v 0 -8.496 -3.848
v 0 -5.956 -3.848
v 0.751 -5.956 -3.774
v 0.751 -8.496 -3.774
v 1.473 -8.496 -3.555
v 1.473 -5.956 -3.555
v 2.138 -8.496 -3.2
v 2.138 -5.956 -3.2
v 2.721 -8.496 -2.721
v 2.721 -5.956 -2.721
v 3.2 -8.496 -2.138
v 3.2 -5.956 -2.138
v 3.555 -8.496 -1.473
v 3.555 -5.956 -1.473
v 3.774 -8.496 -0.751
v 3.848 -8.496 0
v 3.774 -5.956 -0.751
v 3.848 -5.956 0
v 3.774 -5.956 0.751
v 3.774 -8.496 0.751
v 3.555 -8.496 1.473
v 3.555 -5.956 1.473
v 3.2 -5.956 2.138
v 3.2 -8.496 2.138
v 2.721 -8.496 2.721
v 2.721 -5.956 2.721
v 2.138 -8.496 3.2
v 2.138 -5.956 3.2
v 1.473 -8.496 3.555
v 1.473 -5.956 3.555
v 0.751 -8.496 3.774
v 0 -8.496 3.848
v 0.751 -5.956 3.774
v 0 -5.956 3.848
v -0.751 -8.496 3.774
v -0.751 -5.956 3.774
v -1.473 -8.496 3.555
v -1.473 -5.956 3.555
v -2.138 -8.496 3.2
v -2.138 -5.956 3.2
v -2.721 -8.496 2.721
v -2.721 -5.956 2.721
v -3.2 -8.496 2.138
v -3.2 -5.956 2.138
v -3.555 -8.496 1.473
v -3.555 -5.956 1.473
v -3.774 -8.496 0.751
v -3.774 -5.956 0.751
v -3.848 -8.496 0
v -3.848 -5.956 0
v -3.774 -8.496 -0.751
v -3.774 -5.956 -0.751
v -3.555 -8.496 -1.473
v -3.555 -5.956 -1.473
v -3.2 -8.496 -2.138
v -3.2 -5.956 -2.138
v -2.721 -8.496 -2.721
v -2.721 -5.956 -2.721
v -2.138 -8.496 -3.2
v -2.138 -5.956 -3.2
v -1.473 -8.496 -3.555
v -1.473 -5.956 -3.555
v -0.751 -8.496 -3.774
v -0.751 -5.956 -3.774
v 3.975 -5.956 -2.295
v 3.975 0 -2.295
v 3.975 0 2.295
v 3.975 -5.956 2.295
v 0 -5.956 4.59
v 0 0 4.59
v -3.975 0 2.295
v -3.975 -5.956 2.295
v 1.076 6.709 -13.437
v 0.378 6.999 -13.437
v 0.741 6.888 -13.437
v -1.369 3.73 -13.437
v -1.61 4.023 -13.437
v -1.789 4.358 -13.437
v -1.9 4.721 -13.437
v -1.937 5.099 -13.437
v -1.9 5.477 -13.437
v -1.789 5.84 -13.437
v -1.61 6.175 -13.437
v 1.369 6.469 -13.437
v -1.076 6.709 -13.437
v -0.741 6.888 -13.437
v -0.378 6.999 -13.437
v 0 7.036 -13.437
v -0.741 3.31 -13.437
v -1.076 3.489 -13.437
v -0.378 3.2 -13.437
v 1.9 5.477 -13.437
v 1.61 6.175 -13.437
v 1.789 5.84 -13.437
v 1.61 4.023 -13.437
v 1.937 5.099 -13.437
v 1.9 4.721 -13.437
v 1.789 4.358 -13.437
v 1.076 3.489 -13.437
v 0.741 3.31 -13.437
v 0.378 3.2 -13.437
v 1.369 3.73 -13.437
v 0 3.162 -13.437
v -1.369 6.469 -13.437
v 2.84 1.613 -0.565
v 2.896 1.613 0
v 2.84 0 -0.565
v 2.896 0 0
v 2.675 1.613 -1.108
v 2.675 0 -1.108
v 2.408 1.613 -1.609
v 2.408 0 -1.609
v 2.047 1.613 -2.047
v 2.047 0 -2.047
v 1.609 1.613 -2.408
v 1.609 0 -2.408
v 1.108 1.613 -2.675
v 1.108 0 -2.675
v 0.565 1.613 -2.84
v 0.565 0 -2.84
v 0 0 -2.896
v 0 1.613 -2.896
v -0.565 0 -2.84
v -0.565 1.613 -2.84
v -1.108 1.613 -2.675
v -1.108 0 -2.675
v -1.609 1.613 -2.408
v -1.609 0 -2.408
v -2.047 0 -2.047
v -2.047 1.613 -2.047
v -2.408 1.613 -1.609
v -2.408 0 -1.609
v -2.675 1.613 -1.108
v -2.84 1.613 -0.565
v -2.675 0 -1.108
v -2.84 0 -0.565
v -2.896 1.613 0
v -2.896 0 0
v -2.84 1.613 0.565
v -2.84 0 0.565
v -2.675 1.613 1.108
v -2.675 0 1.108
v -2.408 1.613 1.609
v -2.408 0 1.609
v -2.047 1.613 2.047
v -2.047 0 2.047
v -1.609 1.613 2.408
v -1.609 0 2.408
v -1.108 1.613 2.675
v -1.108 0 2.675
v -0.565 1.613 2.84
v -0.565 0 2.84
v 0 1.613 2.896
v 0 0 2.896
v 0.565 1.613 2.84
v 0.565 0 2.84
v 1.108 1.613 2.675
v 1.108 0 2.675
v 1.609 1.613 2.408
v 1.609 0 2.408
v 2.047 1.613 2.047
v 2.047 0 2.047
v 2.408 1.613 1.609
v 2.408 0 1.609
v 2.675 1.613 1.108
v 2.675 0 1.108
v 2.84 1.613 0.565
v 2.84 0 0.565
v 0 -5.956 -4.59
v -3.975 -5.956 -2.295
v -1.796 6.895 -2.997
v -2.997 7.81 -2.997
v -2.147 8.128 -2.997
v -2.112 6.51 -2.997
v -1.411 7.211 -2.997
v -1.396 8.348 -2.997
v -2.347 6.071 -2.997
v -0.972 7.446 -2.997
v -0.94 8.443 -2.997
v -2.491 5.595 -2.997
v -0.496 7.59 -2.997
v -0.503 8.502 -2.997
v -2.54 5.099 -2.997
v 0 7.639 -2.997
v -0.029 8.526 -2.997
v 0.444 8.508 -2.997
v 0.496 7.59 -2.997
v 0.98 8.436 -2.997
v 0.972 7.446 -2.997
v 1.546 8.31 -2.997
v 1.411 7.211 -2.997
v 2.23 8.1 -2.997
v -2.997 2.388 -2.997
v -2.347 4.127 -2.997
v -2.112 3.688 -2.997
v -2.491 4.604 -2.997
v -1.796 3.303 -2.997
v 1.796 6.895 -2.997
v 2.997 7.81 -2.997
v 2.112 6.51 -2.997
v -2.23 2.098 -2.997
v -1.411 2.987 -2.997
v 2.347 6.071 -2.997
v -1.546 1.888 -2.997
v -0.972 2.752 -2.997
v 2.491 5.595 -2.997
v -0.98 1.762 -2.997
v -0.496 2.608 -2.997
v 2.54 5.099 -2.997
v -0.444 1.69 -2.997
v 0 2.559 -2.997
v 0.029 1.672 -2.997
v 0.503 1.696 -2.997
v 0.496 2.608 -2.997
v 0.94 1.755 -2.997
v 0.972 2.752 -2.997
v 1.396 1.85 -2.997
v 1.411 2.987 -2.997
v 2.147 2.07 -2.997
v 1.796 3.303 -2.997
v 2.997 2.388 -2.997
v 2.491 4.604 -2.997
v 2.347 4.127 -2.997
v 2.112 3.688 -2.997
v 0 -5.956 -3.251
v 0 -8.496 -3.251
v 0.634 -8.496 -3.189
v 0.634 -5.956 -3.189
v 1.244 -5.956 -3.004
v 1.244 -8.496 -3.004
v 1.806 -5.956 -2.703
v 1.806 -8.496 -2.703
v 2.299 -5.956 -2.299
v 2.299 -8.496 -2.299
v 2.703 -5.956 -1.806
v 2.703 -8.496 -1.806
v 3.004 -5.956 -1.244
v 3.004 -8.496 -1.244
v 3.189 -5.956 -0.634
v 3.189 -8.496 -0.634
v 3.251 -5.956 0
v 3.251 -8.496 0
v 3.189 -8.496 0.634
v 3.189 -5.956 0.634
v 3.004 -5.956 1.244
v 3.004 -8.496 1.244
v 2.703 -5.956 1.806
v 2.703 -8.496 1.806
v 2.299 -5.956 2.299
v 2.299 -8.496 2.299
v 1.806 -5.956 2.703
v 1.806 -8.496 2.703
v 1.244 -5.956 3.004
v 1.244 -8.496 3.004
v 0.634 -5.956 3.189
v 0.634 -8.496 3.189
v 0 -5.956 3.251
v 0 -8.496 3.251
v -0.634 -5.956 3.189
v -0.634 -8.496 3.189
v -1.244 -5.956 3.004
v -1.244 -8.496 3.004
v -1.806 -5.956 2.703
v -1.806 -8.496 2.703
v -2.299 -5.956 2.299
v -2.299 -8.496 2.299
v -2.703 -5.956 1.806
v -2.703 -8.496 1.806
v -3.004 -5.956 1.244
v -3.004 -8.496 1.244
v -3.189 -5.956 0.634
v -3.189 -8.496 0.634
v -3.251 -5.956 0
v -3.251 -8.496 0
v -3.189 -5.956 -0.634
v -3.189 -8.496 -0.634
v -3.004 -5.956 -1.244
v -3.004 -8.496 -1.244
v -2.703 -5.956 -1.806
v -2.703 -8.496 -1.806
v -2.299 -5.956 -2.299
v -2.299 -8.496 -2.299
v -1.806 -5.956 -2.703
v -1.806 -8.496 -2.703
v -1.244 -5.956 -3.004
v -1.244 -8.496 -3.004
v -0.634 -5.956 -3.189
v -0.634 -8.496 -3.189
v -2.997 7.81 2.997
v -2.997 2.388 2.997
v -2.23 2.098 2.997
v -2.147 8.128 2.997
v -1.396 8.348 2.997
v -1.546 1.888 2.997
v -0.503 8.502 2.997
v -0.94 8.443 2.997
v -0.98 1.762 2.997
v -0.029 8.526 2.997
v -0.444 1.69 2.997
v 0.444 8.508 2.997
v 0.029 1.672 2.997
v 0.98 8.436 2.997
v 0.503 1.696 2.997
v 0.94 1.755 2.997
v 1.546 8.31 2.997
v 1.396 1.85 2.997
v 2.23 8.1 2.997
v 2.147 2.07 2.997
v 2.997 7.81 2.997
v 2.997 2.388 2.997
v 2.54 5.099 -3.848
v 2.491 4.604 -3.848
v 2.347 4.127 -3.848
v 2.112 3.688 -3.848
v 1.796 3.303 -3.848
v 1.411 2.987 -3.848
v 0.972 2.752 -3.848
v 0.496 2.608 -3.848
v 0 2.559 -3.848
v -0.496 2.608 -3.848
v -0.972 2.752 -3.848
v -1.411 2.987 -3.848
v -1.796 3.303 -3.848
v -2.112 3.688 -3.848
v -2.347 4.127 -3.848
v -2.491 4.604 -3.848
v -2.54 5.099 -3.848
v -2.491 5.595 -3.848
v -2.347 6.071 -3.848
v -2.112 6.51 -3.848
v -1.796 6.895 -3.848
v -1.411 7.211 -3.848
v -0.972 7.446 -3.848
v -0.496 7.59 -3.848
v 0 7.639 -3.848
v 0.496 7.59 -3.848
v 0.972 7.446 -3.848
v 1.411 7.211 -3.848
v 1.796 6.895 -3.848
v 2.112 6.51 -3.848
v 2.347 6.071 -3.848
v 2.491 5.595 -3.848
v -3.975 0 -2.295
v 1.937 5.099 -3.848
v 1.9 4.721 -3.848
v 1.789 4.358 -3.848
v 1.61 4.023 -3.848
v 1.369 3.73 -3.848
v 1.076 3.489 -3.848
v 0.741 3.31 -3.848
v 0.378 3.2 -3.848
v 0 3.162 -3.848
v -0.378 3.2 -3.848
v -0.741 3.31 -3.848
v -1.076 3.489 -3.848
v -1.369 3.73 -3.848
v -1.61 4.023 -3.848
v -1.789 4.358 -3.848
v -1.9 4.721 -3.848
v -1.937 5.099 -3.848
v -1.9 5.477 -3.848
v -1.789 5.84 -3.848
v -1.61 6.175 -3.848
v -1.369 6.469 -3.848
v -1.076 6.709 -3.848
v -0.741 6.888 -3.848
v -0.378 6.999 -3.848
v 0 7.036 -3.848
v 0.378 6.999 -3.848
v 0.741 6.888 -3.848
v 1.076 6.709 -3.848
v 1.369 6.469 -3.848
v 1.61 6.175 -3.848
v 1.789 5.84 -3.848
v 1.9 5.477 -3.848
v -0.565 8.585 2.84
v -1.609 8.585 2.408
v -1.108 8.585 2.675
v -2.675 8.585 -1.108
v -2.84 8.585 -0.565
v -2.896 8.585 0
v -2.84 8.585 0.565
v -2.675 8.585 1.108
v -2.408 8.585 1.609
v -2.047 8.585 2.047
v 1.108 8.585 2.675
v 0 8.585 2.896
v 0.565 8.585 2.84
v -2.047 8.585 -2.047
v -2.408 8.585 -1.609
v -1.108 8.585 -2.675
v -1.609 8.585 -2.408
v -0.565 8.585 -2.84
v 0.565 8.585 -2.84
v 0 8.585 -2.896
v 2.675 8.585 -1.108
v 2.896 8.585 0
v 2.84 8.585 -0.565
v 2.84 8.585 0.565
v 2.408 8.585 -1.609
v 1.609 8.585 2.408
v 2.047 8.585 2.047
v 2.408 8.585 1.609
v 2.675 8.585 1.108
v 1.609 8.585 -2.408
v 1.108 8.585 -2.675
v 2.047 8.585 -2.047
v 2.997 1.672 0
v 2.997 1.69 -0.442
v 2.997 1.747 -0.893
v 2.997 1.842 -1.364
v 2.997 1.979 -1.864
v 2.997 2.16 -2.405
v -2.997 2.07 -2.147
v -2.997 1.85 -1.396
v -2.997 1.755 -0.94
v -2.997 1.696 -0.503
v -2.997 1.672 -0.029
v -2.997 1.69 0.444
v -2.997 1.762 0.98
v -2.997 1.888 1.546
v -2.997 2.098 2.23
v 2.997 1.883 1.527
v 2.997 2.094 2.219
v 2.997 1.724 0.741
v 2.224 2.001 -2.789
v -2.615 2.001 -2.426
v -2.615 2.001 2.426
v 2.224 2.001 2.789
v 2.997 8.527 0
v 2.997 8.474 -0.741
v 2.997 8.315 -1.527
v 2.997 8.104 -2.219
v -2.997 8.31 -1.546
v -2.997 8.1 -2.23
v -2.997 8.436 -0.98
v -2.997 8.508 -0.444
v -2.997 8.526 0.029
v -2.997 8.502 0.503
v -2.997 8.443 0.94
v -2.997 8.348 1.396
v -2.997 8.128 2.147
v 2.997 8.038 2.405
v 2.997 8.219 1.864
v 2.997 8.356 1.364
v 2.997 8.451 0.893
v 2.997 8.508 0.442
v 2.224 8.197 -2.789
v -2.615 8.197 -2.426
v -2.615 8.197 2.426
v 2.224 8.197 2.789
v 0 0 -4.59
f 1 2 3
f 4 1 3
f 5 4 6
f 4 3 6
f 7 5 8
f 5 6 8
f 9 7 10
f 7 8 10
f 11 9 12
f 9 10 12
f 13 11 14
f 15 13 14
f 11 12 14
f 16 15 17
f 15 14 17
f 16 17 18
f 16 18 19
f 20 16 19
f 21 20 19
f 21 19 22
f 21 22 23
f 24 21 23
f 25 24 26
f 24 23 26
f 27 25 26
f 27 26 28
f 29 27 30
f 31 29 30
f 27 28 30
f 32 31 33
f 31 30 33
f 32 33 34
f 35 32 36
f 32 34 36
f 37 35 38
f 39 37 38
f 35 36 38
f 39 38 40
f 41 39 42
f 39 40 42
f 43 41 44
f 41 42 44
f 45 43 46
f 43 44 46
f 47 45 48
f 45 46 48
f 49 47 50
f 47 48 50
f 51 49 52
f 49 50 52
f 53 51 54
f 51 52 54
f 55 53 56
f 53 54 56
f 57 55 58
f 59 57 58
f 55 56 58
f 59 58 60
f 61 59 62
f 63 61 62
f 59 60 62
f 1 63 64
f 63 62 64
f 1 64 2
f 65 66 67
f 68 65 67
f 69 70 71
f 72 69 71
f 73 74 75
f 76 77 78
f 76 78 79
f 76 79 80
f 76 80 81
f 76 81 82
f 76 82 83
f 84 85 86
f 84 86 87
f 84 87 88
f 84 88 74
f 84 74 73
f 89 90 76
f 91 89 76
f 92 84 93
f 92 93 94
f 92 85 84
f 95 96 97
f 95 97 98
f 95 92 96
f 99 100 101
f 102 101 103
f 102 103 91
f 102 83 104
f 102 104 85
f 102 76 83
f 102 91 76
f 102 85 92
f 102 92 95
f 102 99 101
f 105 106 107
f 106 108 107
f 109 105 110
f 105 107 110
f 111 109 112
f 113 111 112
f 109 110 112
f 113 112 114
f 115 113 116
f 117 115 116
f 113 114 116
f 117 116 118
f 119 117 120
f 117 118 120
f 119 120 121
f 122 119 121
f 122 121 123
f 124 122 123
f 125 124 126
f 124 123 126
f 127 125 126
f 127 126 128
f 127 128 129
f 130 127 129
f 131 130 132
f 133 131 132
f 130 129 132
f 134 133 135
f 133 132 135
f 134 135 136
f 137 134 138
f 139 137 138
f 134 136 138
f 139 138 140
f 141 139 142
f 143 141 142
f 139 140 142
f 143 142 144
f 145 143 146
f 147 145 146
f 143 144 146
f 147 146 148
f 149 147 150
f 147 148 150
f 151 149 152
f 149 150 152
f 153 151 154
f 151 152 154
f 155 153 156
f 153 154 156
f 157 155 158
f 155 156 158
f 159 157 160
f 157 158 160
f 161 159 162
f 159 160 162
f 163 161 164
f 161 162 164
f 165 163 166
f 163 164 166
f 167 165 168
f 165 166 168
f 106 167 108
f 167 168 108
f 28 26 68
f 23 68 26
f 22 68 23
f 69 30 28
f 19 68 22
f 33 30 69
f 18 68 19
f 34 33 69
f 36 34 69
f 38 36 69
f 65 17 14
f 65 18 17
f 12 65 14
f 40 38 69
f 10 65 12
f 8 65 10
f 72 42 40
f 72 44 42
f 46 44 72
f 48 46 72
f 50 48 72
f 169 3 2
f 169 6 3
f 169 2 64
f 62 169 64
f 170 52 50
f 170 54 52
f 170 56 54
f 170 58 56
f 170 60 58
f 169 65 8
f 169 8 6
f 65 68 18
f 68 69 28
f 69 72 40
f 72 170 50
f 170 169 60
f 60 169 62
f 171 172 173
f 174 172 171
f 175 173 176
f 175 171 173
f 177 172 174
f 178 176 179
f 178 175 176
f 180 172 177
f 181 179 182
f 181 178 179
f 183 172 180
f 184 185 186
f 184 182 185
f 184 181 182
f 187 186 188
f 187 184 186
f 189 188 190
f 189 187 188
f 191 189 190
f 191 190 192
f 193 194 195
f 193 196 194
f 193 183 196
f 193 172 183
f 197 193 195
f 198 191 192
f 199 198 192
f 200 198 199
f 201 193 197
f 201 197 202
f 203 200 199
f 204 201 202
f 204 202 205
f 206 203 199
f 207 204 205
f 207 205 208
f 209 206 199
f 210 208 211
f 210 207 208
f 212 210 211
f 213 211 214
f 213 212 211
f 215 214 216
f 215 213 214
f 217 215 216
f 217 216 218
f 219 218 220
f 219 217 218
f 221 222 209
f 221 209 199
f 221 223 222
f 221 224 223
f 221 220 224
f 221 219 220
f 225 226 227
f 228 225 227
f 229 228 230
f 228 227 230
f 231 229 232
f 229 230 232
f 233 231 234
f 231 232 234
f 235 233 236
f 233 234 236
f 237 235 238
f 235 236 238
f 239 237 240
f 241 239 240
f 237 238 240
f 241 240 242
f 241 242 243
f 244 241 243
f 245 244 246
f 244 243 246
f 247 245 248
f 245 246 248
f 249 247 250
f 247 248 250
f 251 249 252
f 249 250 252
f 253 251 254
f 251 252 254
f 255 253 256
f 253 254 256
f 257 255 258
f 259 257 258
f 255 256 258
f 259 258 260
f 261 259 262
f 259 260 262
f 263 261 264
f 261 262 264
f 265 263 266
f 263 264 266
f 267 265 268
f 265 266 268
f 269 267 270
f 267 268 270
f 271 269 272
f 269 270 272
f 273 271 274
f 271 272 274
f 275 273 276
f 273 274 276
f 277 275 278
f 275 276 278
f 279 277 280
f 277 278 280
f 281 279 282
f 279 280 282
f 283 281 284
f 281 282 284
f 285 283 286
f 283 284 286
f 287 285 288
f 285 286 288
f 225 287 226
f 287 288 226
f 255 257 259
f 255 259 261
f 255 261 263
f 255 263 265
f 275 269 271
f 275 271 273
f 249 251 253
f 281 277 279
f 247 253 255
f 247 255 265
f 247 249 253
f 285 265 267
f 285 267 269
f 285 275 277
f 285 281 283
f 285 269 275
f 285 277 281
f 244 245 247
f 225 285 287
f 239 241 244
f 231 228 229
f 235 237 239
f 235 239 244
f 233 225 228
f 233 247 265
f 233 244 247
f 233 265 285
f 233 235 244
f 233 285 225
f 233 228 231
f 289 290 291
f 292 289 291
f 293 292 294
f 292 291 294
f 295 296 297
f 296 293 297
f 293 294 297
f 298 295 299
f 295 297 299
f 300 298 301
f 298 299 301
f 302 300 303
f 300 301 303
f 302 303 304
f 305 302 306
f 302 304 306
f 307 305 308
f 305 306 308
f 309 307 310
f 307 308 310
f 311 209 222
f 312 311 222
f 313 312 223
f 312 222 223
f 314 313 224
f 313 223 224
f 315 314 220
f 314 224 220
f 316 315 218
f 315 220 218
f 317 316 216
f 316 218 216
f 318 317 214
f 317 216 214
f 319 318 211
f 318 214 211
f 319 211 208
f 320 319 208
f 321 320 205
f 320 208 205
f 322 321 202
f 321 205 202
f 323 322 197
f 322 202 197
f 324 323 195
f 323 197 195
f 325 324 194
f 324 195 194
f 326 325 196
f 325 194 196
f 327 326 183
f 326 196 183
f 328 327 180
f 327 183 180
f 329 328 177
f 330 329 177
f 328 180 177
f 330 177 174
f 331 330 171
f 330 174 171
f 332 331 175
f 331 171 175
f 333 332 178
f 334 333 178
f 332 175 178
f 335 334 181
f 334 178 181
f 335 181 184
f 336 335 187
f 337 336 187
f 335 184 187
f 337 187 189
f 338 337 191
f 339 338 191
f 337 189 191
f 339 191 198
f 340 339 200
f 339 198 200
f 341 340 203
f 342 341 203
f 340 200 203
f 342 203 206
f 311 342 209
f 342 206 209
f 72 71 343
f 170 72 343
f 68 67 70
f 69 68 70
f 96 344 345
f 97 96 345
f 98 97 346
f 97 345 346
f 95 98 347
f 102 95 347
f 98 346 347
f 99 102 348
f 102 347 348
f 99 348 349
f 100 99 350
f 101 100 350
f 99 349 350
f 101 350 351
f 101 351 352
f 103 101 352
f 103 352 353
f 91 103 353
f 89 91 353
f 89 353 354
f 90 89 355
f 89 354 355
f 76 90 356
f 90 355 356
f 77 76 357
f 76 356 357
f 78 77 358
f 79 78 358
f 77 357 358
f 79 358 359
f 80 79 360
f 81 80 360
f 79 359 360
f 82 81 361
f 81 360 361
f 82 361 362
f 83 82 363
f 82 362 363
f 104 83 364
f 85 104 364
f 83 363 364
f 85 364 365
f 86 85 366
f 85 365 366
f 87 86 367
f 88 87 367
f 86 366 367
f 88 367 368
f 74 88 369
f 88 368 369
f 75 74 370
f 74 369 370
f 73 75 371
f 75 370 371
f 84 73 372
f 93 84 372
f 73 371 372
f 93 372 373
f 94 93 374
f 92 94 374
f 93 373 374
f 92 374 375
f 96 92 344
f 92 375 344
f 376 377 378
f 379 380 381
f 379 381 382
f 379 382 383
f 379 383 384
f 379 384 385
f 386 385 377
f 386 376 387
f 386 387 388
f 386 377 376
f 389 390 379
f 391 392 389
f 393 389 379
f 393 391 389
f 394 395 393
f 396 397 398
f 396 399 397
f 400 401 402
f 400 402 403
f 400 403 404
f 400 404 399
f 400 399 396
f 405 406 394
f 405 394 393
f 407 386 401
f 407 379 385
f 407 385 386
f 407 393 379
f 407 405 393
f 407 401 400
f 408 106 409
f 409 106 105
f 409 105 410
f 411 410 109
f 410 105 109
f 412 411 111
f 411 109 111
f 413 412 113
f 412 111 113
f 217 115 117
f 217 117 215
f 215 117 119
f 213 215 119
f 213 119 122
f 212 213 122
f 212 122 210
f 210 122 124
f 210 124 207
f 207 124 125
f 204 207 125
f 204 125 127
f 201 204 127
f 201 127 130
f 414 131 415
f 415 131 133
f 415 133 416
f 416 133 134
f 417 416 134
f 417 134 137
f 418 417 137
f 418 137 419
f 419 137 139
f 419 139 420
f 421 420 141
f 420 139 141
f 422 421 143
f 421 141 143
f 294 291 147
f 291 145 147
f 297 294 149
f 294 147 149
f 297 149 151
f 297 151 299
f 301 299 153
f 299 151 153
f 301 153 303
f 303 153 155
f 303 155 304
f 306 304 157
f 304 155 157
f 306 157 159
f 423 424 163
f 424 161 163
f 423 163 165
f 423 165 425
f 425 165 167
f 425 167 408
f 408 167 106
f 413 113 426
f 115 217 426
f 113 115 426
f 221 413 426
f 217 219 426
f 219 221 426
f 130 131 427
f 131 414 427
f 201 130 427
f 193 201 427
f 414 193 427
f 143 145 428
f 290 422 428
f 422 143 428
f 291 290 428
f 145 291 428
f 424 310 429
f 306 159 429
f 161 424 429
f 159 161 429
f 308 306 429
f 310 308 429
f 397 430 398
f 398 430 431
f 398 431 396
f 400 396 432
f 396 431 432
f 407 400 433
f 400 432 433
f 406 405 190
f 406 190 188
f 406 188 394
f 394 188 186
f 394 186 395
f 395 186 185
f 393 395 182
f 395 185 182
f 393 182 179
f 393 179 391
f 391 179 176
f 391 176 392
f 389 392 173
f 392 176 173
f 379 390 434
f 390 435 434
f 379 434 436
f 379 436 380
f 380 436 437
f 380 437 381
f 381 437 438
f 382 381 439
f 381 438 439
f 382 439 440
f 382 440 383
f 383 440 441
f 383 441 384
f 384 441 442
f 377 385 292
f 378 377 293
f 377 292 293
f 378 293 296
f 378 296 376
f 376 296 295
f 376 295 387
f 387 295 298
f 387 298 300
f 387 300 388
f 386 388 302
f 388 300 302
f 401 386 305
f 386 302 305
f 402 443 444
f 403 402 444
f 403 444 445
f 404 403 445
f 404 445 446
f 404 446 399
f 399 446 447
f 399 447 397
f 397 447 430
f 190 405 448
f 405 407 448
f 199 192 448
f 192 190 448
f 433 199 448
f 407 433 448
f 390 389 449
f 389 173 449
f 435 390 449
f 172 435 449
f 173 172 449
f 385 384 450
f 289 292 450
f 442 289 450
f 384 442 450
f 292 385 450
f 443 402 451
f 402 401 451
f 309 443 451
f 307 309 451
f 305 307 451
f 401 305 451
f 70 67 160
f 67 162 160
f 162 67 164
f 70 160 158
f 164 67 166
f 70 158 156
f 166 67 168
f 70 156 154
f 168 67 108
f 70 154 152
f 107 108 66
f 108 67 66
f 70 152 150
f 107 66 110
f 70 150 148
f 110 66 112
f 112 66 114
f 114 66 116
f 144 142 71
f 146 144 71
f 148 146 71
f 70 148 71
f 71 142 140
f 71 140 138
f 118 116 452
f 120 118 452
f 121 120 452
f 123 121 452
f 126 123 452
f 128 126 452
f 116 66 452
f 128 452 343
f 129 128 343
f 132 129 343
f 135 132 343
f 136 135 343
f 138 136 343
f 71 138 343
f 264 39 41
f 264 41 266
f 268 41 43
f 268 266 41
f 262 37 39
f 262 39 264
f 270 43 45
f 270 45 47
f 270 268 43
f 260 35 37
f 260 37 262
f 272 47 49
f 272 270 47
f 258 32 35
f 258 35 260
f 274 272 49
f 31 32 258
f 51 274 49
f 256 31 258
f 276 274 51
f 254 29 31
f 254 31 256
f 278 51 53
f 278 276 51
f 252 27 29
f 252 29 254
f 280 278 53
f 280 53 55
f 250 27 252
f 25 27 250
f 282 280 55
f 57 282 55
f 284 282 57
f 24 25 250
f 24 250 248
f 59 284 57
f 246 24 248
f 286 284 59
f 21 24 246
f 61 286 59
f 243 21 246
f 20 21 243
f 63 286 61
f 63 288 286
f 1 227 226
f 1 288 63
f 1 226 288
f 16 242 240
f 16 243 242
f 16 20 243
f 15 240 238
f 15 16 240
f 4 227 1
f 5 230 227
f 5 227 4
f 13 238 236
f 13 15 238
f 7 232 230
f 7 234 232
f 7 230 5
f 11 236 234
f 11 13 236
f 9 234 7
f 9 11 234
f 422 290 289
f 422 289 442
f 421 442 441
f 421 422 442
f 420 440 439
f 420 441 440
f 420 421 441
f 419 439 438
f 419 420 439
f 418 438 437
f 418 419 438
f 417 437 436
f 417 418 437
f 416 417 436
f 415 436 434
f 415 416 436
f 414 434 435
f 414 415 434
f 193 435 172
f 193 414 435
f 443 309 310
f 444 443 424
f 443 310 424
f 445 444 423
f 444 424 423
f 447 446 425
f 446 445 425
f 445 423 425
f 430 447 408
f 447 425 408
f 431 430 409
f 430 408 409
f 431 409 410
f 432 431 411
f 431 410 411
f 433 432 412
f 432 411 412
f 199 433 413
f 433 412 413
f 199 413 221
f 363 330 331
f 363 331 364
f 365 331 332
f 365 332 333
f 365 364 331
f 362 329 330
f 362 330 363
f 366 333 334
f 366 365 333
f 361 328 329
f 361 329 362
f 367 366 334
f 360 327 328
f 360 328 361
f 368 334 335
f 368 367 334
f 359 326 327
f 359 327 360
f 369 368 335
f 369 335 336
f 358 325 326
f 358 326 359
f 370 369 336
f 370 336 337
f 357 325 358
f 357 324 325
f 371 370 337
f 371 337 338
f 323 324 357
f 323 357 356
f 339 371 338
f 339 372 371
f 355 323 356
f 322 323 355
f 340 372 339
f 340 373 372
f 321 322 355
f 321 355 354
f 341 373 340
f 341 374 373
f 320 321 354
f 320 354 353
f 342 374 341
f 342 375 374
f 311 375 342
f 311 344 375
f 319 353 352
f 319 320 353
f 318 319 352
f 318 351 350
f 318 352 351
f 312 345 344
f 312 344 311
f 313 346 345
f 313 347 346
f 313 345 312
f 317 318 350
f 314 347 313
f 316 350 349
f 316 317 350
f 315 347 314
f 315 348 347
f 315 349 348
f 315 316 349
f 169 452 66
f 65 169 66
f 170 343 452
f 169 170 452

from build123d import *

# Parameters (mm, degrees)
SKETCH1_W           = 5.9944
SKETCH1_H           = 5.9944
BOSS_EXTRUDE1_DEPTH = 8.5852
SKETCH3_R           = 2.54
BOSS_EXTRUDE2_DEPTH = 0.8509
SKETCH4_R           = 1.93675
BOSS_EXTRUDE3_DEPTH = 9.5885
BOSS_EXTRUDE4_DEPTH = 5.9563
SKETCH6_R           = 3.8481
BOSS_EXTRUDE5_DEPTH = 2.54
SKETCH7_R           = 3.2512
CUT_EXTRUDE1_DEPTH  = 2.54


with BuildPart() as part:
    # Sketch1 → Boss-Extrude1 (new body)
    with BuildSketch(Plane(origin=(0, 0, 0), x_dir=(1, 0, 0), z_dir=(0, 1, 0))):
        Rectangle(SKETCH1_W, SKETCH1_H)
    extrude(amount=BOSS_EXTRUDE1_DEPTH)

    # Sketch2 → Cut-Revolve1 (revolve, cut)
    with BuildSketch(Plane.XY):
        Polygon((2.8956, 1.6129), (2.8956, 0), (5.460904916, -1.481079484), (5.460904916, 3.093979484), align=None)
        Polygon((2.9972, 8.5852), (2.8956, 8.5852), (5.460904916, 7.104120516), (5.460904916, 8.5852), align=None)
    revolve(axis=Axis((0, 0.80645, 0), (0, 1, 0)), mode=Mode.SUBTRACT)

    # Sketch3 → Boss-Extrude2 (add)
    with BuildSketch(Plane(origin=(0, 0, -2.9972), x_dir=(-1, 0, 0), z_dir=(0, 0, -1))):
        with Locations(Location((0, 5.09905, 0), (0, 0, 180))):
            Circle(SKETCH3_R)
    extrude(amount=BOSS_EXTRUDE2_DEPTH)

    # Sketch4 → Boss-Extrude3 (add)
    with BuildSketch(Plane(origin=(0, 0, -3.8481), x_dir=(-1, 0, 0), z_dir=(0, 0, -1))):
        with Locations(Location((0, 5.09905, 0), (0, 0, 180))):
            Circle(SKETCH4_R)
    extrude(amount=BOSS_EXTRUDE3_DEPTH)

    # Sketch5 → Boss-Extrude4 (add)
    with BuildSketch(Plane(origin=(0, 0, 0), x_dir=(-1, 0, 0), z_dir=(0, -1, 0))):
        Polygon((0, 4.59005011), (-3.9751, 2.295025055), (-3.9751, -2.295025055), (0, -4.59005011), (3.9751, -2.295025055), (3.9751, 2.295025055), align=None)
    extrude(amount=BOSS_EXTRUDE4_DEPTH)

    # Sketch6 → Boss-Extrude5 (add)
    with BuildSketch(Plane(origin=(0, -5.9563, 0), x_dir=(-1, 0, 0), z_dir=(0, -1, 0))):
        with Locations(Location((0, 0, 0), (0, 0, 90))):
            Circle(SKETCH6_R)
    extrude(amount=BOSS_EXTRUDE5_DEPTH)

    # Sketch7 → Cut-Extrude1 (cut)
    with BuildSketch(Plane(origin=(0, -8.4963, 0), x_dir=(-1, 0, 0), z_dir=(0, -1, 0))):
        with Locations(Location((0, 0, 0), (0, 0, 90))):
            Circle(SKETCH7_R)
    extrude(amount=-CUT_EXTRUDE1_DEPTH, mode=Mode.SUBTRACT)


solid = part.part
